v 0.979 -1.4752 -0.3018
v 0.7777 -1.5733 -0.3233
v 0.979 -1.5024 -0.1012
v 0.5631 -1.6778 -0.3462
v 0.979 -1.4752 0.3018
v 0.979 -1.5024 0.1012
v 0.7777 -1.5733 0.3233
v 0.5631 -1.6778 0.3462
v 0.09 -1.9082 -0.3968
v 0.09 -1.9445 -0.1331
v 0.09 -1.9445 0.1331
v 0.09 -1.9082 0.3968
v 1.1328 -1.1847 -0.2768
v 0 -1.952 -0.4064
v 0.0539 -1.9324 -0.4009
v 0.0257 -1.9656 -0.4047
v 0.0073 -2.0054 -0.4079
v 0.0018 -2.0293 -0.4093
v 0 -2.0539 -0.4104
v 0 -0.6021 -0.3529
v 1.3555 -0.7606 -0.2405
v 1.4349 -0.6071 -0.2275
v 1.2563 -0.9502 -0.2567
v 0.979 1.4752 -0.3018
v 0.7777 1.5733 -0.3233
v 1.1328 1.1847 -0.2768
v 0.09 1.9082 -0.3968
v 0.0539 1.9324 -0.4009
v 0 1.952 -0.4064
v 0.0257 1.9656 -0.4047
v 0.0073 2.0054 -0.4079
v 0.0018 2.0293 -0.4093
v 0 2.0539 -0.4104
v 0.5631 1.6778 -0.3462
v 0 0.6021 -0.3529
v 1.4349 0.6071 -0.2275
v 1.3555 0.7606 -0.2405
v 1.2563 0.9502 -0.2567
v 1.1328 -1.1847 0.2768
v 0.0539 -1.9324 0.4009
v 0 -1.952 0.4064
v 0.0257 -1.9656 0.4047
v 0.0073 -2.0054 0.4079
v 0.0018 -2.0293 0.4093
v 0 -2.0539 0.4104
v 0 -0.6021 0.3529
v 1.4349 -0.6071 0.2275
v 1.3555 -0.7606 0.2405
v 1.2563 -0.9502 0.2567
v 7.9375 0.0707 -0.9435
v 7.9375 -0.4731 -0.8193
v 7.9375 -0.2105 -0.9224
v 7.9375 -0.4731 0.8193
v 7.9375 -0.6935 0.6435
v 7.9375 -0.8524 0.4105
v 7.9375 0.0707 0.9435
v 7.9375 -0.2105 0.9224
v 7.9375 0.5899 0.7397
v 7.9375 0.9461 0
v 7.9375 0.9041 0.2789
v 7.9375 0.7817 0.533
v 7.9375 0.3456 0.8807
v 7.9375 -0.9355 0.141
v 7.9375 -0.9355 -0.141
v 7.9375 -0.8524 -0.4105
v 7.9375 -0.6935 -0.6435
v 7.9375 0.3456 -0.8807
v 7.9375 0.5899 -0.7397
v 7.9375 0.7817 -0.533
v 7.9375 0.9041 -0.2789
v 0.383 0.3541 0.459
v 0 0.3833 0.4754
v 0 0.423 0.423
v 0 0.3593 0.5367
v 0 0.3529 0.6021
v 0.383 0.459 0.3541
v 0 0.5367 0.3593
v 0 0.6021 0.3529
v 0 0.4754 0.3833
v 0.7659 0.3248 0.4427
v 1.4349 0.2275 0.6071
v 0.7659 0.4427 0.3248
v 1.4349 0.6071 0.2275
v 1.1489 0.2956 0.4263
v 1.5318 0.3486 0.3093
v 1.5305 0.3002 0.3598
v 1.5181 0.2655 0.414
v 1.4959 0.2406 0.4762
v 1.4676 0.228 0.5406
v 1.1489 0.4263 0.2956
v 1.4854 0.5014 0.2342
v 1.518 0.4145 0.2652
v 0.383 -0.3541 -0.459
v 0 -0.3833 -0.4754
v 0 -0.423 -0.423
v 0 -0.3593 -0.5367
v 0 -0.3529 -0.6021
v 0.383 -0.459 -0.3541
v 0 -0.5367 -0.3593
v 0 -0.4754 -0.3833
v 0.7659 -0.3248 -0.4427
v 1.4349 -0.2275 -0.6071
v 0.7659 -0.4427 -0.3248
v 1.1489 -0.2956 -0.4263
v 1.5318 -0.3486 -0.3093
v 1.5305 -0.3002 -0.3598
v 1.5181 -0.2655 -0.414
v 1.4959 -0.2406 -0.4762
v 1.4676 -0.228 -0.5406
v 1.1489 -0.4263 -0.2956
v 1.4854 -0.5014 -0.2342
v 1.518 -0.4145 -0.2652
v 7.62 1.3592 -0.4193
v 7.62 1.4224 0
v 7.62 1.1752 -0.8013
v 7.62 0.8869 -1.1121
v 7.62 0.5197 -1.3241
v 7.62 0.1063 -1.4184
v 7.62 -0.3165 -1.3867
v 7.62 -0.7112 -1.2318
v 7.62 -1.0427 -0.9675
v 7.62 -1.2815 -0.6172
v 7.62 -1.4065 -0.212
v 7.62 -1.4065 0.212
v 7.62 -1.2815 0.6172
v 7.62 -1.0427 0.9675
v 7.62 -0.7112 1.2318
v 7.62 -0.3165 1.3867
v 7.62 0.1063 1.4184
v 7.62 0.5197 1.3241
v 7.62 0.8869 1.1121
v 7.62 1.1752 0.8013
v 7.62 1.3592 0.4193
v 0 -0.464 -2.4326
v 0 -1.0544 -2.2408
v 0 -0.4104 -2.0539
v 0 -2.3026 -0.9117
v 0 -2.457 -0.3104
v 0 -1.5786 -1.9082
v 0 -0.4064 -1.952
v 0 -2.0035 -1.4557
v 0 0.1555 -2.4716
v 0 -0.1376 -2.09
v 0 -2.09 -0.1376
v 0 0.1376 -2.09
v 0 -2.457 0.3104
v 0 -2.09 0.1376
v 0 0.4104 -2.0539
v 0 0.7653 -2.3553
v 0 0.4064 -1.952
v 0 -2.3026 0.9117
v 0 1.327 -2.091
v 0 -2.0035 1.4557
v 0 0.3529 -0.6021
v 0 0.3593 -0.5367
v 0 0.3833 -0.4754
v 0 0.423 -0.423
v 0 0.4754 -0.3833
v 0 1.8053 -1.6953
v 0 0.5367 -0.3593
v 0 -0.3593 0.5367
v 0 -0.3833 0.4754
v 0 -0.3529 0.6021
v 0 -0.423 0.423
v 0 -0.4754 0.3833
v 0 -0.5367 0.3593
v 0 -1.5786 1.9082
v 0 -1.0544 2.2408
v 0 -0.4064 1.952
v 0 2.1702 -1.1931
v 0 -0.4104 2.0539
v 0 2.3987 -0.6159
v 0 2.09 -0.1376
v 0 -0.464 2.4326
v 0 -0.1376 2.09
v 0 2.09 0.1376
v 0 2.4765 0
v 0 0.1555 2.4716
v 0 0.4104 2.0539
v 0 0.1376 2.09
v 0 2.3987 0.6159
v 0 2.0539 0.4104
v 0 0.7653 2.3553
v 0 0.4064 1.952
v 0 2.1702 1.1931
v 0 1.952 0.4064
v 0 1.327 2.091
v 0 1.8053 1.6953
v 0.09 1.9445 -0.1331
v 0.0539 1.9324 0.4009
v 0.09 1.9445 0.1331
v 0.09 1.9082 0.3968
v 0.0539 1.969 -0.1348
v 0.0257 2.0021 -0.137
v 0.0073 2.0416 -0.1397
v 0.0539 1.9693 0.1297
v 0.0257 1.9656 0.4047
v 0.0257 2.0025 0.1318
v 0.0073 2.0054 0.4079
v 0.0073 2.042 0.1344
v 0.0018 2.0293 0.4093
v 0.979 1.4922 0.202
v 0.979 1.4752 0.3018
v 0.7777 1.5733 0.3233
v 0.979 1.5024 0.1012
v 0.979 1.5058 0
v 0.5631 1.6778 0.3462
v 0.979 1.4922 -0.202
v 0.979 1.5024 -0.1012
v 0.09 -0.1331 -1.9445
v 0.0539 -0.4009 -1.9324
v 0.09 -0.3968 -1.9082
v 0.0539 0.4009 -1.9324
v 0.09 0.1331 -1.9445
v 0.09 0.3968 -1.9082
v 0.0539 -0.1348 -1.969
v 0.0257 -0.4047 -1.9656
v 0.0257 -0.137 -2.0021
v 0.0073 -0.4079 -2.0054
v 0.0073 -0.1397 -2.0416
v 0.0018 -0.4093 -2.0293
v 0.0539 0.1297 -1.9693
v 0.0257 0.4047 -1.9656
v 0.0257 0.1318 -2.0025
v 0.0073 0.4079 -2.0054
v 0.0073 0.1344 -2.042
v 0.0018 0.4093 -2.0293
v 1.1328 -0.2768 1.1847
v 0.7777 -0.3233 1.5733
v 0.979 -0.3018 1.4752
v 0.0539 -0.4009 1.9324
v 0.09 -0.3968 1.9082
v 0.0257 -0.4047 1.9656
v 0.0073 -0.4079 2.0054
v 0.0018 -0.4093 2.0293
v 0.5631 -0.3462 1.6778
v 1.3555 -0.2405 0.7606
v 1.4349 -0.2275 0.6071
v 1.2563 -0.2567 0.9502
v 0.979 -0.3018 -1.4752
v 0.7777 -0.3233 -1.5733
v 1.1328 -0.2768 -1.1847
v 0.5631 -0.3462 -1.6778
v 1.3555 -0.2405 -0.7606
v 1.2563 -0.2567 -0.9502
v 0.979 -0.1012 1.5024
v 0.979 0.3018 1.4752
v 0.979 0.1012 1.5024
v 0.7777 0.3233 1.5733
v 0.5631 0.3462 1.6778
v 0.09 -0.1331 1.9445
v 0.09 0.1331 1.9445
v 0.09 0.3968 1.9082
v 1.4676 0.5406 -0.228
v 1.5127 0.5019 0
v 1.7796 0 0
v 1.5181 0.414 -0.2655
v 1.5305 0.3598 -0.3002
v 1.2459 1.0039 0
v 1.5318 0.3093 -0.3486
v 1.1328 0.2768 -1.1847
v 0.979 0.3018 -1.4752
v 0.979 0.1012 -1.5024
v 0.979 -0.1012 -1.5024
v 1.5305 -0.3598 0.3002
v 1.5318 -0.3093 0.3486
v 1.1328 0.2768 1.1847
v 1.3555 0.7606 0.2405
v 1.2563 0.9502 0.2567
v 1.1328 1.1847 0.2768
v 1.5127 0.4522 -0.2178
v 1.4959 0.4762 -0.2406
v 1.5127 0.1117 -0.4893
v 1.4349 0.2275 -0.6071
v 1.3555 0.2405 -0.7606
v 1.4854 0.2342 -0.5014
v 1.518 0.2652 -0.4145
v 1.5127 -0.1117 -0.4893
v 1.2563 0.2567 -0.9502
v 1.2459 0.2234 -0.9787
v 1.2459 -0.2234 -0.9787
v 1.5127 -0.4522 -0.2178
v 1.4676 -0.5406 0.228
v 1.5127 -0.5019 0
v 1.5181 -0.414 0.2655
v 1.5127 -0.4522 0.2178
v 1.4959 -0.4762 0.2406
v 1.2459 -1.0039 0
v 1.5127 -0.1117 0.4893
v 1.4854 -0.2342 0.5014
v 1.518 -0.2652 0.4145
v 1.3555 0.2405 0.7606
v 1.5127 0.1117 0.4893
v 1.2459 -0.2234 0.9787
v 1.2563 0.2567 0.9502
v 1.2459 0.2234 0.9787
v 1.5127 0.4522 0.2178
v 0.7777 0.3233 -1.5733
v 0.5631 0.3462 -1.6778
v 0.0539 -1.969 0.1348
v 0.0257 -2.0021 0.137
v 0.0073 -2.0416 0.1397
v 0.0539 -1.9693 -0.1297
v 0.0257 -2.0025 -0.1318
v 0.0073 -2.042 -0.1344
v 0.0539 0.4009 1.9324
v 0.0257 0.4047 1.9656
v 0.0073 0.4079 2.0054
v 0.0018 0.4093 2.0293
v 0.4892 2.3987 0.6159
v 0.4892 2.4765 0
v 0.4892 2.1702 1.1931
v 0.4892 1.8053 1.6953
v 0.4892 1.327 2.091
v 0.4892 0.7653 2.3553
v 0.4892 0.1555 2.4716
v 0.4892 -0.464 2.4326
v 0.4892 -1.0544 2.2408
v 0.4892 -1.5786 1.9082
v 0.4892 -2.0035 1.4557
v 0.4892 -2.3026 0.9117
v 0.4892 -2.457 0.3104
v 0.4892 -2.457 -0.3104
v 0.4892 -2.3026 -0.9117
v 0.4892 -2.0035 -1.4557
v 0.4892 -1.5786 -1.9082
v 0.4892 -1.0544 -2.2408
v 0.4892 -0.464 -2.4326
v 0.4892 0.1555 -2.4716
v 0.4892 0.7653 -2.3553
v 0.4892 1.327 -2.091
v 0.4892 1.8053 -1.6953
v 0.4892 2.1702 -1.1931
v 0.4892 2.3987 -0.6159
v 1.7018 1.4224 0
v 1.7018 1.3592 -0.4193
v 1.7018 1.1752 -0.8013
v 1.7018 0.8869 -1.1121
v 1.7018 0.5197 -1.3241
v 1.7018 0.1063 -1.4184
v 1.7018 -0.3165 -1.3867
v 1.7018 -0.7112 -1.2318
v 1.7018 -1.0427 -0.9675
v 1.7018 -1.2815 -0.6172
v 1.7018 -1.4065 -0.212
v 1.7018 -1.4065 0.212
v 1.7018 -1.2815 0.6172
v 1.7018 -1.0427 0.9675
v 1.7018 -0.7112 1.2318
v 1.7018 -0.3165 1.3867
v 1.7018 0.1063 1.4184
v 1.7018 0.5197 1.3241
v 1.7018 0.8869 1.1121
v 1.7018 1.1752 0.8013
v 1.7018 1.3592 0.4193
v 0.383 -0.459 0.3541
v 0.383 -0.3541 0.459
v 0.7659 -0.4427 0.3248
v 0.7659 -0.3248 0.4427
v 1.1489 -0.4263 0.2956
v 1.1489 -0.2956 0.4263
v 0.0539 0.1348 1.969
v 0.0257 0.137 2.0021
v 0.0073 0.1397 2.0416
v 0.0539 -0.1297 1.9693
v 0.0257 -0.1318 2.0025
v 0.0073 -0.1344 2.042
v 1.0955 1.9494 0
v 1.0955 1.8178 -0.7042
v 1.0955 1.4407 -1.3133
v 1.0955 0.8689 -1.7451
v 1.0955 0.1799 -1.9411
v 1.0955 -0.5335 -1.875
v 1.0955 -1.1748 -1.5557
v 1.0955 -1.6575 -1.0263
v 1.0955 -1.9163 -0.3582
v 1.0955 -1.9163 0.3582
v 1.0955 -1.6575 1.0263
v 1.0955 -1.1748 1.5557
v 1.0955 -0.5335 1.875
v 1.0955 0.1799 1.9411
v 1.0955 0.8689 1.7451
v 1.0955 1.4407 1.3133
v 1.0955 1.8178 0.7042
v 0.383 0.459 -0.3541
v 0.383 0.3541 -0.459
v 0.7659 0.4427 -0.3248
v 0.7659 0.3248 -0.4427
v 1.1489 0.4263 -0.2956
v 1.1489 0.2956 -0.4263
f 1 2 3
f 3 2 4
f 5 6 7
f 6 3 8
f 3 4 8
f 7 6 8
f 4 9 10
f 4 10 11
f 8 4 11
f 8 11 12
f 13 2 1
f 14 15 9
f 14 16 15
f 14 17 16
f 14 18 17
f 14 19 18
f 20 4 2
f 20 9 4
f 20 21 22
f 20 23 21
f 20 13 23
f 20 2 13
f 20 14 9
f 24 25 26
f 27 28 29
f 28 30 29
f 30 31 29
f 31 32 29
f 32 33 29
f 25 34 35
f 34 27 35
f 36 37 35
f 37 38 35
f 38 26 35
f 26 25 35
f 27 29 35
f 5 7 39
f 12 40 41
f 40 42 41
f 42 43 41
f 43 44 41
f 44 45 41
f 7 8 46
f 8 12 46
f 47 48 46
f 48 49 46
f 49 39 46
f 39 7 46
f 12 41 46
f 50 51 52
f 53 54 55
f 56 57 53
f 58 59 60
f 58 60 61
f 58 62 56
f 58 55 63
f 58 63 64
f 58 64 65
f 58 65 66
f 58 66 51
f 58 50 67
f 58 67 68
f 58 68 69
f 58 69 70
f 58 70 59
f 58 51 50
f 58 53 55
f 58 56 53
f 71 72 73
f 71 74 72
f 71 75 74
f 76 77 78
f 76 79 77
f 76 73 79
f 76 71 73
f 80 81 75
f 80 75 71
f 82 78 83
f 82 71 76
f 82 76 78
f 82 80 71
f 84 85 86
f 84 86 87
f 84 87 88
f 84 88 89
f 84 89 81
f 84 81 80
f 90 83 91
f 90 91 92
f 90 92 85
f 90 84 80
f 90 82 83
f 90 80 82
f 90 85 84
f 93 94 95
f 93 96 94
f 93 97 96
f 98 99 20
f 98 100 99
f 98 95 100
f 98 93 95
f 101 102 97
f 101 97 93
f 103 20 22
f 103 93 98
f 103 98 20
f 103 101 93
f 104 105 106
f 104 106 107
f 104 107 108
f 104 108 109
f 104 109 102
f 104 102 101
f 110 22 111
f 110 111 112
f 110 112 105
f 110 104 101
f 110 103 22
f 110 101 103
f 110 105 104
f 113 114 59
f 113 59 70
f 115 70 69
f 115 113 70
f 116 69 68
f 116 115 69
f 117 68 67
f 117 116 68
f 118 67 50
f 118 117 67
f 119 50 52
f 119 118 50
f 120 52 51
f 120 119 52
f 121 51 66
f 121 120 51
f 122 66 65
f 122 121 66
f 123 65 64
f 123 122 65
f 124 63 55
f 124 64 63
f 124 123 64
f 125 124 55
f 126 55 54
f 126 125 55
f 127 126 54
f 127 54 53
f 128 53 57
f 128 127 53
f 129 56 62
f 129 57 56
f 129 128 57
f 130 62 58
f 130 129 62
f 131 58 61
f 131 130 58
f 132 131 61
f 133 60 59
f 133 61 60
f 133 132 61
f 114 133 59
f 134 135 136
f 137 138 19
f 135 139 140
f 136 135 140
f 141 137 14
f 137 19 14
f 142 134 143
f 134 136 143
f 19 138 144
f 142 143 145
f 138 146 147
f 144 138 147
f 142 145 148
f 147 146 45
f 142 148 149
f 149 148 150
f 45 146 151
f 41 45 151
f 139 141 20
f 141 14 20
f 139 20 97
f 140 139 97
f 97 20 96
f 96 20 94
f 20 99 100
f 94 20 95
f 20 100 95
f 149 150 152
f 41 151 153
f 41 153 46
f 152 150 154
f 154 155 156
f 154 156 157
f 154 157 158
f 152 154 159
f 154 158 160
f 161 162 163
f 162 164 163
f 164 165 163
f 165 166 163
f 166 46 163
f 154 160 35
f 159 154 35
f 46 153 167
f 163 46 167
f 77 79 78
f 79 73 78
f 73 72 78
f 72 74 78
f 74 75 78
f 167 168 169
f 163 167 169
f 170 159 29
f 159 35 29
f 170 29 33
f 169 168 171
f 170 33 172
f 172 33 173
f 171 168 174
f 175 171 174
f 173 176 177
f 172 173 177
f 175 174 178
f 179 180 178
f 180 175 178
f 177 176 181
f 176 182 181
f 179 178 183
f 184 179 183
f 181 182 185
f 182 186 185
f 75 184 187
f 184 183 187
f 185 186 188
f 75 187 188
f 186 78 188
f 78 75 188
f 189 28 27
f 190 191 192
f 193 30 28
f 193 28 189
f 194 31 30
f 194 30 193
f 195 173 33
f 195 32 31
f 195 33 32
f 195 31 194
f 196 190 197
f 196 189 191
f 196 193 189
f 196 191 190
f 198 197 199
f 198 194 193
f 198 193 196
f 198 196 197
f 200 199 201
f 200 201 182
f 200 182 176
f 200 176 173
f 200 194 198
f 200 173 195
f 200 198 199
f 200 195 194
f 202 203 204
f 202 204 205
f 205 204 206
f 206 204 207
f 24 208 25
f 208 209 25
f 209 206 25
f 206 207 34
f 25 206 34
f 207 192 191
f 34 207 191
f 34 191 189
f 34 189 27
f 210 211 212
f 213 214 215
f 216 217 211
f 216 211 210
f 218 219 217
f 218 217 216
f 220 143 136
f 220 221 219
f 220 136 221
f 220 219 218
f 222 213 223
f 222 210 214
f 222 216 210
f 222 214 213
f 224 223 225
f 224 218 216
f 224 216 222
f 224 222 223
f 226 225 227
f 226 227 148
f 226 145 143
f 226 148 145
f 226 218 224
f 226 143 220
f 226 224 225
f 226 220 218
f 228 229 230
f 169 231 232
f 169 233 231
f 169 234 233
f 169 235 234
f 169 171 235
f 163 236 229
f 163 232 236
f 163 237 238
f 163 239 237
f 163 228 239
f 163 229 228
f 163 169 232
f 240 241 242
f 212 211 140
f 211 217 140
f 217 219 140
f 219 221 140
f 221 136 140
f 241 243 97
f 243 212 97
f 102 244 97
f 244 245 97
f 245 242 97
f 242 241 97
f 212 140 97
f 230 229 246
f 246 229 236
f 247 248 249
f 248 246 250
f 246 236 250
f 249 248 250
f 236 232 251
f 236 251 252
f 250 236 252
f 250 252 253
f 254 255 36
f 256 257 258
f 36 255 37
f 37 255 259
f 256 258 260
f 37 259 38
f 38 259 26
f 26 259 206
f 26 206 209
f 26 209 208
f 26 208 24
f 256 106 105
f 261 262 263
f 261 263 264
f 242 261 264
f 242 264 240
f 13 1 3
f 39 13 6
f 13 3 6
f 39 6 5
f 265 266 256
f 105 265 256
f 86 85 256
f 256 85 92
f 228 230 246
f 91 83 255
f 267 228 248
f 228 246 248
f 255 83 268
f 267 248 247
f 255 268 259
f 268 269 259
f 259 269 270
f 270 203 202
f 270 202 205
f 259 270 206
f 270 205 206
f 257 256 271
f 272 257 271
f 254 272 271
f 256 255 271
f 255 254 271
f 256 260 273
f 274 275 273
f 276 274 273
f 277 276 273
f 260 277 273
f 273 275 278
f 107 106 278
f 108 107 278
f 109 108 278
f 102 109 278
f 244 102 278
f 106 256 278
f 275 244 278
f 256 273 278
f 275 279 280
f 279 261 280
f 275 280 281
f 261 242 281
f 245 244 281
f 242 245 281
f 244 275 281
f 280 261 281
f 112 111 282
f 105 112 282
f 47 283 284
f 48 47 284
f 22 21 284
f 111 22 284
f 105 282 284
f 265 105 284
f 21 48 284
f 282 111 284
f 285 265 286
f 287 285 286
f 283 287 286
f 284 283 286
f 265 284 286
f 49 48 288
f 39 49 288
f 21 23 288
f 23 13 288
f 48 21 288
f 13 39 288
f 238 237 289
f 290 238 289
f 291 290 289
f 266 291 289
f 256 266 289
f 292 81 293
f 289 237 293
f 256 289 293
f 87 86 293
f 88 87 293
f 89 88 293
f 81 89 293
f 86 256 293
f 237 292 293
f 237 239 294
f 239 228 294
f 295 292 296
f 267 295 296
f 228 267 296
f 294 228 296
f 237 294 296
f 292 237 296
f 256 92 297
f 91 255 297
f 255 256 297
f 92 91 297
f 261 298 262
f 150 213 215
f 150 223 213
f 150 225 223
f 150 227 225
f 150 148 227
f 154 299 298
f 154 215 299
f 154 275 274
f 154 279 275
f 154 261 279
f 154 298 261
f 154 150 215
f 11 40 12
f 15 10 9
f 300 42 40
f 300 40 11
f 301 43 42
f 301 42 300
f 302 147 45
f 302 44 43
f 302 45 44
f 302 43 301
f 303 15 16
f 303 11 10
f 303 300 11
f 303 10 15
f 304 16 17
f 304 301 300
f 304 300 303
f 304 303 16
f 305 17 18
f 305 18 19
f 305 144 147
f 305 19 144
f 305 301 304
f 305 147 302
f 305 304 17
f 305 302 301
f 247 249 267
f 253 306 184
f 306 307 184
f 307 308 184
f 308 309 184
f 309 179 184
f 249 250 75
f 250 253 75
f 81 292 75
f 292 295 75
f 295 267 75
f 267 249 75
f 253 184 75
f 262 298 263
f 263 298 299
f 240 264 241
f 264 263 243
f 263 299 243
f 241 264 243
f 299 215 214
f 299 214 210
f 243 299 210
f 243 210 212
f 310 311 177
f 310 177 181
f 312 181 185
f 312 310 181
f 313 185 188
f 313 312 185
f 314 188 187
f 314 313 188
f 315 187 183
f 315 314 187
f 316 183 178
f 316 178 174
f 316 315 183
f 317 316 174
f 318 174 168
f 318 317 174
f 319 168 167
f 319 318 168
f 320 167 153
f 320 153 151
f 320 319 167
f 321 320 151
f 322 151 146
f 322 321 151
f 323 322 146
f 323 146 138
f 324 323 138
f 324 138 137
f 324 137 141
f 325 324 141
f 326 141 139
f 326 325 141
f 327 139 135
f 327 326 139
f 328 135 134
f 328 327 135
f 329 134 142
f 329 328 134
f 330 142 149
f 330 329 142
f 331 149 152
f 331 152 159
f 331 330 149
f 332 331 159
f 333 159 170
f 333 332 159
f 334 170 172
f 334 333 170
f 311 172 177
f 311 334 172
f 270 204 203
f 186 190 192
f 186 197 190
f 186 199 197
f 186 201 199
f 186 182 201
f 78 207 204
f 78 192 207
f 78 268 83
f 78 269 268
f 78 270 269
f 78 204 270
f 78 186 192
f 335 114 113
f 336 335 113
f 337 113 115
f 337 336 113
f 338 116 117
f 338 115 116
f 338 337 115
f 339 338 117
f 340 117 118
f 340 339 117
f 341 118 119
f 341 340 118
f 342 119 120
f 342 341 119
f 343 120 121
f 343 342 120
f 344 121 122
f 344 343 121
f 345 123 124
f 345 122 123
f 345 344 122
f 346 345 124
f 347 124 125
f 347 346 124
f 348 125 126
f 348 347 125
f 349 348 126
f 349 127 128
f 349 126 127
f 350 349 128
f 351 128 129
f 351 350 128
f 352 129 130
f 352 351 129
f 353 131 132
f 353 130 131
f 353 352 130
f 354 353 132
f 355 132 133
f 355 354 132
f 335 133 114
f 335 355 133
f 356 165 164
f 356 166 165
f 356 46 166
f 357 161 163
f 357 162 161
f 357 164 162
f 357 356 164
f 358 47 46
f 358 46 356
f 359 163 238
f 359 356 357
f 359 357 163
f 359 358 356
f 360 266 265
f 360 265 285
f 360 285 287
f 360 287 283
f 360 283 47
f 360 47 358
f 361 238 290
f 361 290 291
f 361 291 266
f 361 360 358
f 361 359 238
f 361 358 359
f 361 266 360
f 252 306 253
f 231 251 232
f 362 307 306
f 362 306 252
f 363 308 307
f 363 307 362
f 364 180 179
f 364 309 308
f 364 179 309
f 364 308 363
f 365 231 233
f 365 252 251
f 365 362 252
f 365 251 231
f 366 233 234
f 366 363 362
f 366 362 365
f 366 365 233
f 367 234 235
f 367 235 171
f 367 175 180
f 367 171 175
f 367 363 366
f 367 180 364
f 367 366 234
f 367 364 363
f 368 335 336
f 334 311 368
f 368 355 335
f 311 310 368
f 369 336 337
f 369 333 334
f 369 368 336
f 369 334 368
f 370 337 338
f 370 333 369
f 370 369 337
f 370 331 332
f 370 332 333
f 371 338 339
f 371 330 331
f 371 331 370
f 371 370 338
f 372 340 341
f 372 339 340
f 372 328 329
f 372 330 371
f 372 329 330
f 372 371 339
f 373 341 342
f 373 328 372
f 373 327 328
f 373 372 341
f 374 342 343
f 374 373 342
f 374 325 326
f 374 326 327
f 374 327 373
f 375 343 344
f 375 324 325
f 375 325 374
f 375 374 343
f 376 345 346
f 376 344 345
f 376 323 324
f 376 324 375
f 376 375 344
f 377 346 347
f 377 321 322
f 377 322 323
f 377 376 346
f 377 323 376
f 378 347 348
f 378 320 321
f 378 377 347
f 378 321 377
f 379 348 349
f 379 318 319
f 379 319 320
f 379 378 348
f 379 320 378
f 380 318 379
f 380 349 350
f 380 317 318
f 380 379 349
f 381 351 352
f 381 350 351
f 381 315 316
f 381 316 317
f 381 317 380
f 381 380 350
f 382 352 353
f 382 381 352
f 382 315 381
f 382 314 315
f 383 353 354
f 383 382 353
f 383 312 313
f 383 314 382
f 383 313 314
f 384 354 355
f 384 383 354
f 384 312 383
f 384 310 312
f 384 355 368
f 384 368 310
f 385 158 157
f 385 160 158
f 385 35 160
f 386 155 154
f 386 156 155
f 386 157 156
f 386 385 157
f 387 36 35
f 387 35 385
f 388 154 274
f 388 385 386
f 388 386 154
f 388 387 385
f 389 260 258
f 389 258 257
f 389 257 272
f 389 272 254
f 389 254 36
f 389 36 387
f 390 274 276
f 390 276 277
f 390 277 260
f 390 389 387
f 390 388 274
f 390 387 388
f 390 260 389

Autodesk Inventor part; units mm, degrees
ref_plane "YZ Plane" through (0, 0, 0) normal (1, 0, 0) x (0, 1, 0)
ref_plane "XZ Plane" through (0, 0, 0) normal (0, 1, 0) x (-1, 0, 0)
sketch "Sketch1" plane through (0, 0, 0) normal (0, 0, 1) x (1, 0, 0)
  line L0 (1.7796, 0) -> (7.9375, 0)
  line L1 (7.9375, 0) -> (7.9375, 1.4224)
  line L2 (7.9375, 1.4224) -> (3.2893, 1.4224)
  line L3 (3.2893, 1.4224) -> (2.6543, 1.4224)
  line L4 (2.6543, 1.4224) -> (1.7018, 1.4224)
  line L5 (0, 2.4765) -> (0, 1.9939)
  line L6 (0, 1.9939) -> (0.979, 1.5058)
  line L7 (0.979, 1.5058) -> (1.7796, 0)
  line L8 (-1.5875, 0) -> (9.525, 0) projected
  line L9 (0, -0.4953) -> (0, 2.9718) projected
  line L10 (0, 2.4765) -> (0.4892, 2.4765)
  line L11 (0.4892, 2.4765) -> (1.7018, 1.4224)
  line L12 (3.2893, 1.4224) -> (1.7018, 1.4224) construction
  dimension "d1" = 4.6482
  dimension "d2" = 2.8448
  dimension "d3" = 2.8448
  dimension "d4" = 3.9878
  dimension "d5" = 26.5
  dimension "d6" = 62
  dimension "d7" = 1.7796
  dimension "d8" = 0.635
  dimension "d12" = 4.953
  dimension "d13" = 41
  dimension "d15" = 7.9375
  dimension "d24" = 1.7018
revolve "Body" add sketch "Sketch1" angle 360 about axis through (1.7796, 0, 0) along (1, 0, 0) contours L7 L6 L5 L10 L11 L4 L3 L2 L1 L0
sketch "Sketch2" plane through (0, 0, 0) normal (-1, 0, 0) x (0, 0, 1)
  line L0 (0, 1.9939) -> (0, 0) construction
  line L1 (0, 0) -> (1.9939, 0) construction
  arc A0 (0.5982, 0) -> (0, 0.5982) centre (0, 0) ccw construction
  arc A1 (0.6979, 0) -> (0, 0.6979) centre (0, 0) ccw construction
  arc A2 (1.952, 0.4064) -> (0.4064, 1.952) centre (0, 0) ccw
  line L2 (0, 0) -> (1.4099, 1.4099) construction
  line L3 (0.4064, 1.952) -> (0.3529, 0.6021)
  line L4 (1.952, 0.4064) -> (0.6021, 0.3529)
  arc A3 (0.4064, 1.952) -> (0, 1.9939) centre (0, 0) ccw
  arc A4 (1.9939, 0) -> (1.952, 0.4064) centre (0, 0) ccw
  line L5 (0, -3.4671) -> (0, 3.4671) projected
  line L6 (-3.4671, 0) -> (3.4671, 0) projected
  arc A5 (0.4064, -1.952) -> (1.952, -0.4064) centre (0, 0) ccw
  line L7 (0.4064, -1.952) -> (0.3529, -0.6021)
  line L8 (1.952, -0.4064) -> (0.6021, -0.3529)
  arc A6 (0, -1.9939) -> (0.4064, -1.952) centre (0, 0) ccw
  arc A7 (1.952, -0.4064) -> (1.9939, 0) centre (0, 0) ccw
  arc A8 (-0.4064, 1.952) -> (-1.952, 0.4064) centre (0, 0) ccw
  line L9 (-0.4064, 1.952) -> (-0.3529, 0.6021)
  line L10 (-1.952, 0.4064) -> (-0.6021, 0.3529)
  arc A9 (0, 1.9939) -> (-0.4064, 1.952) centre (0, 0) ccw
  arc A10 (-1.952, 0.4064) -> (-1.9939, 0) centre (0, 0) ccw
  arc A11 (-0.4064, -1.952) -> (0, -1.9939) centre (0, 0) ccw
  arc A12 (-1.952, -0.4064) -> (-0.4064, -1.952) centre (0, 0) ccw
  arc A13 (-1.9939, 0) -> (-1.952, -0.4064) centre (0, 0) ccw
  line L11 (-1.952, -0.4064) -> (-0.6021, -0.3529)
  line L12 (-0.4064, -1.952) -> (-0.3529, -0.6021)
  arc A14 (0.3529, 0.6021) -> (0.6021, 0.3529) centre (0.5926, 0.5926) ccw
  arc A15 (0.6021, -0.3529) -> (0.3529, -0.6021) centre (0.5926, -0.5926) ccw
  arc A16 (-0.6021, 0.3529) -> (-0.3529, 0.6021) centre (-0.5926, 0.5926) ccw
  arc A17 (-0.3529, -0.6021) -> (-0.6021, -0.3529) centre (-0.5926, -0.5926) ccw
  point P0 (1.4099, -1.4099)
  point P1 (-1.4099, 1.4099)
  point P2 (-1.4099, -1.4099)
  dimension "d17" = 1.1963
  dimension "d18" = 1.3957
  dimension "d19" = 3.9878
  dimension "d20" = 45
  dimension "d21" = 0.4064
extrude "Slot" add sketch "Sketch2" against normal up to next draft 5 contours L4 A14 L3 A2 | A5 L7 A15 L8 | L9 A16 L10 A8 | A12 L11 A17 L12
fillet "Fillet1" radius 0.1626 4 edges at (0, 1.9939, 0) (0, 0, -1.9939) (0, -1.9939, 0) (0, 0, 1.9939)
thread "Thread" size "4-40 UNC" class "2A" standard "ANSI Unified Screw Threads" length 4.6482
chamfer "Chamfer1" distance 0.4763 distance2 0.3175 1 edges at (7.9375, -1.4224, 0) measured on face at (7.9375, -0.4198, 0.2203)
ref_plane "Work Plane2" through (3.35, 0, 0) normal (0, 0, -1) x (1, 0, 0)
equation "\"d1\" = GEL"
equation "\"d2\" = GD"
equation "\"d3\" = BDM"
equation "\"d4\" = SDM"
equation "\"d7\" = INTI"
equation "\"d8\" = GAL"
equation "\"d12\" = KOD"
equation "\"d13\" = 0.5 * SEWI"
equation "\"d15\" = NLG"
equation "\"d24\" = KOH"
equation "\"d17\" = 0.3 * SDM"
equation "\"d18\" = 0.35 * SDM"
equation "\"d19\" = SDM"
equation "\"d21\" = 0.5 * SBR"
equation "\"d23\" = 0.2 * SBR"
equation "\"d10\" = GEL"
equation "\"d25\" = -0.5 * SPD + 0.5 * GD"
equation "\"d26\" = 0.5 * GAL"
equation "\"NLG\" = 7.9375"
equation "\"GEL\" = 4.6482"
equation "\"GAL\" = 0.635"
equation "\"SPD\" = 1.8923"
equation "\"KOD\" = 4.953"
equation "\"KOH\" = 1.7018"
equation "\"SBR\" = 0.8128"
equation "\"SDM\" = 3.9878"
equation "\"GD\" = NND"
equation "\"BDM\" = NND"
equation "\"SEWI\" = 82deg"
equation "\"d9\" = SDM"
equation "\"GUL\" = 0.75 * GAL"
equation "\"TOA\" = 30deg"
equation "\"THREADDIA\" = 2.8448"
equation "\"NND\" = 2.8448"
equation "\"INTI1\" = 2.2352"
equation "\"GD1\" = SPD"
equation "\"INTI\" = 1.779618"
properties part number "ANSI B18.6.3 - 4-40 x 5/16, CRFCHMSTII(3)" material "Steel, Mild"
